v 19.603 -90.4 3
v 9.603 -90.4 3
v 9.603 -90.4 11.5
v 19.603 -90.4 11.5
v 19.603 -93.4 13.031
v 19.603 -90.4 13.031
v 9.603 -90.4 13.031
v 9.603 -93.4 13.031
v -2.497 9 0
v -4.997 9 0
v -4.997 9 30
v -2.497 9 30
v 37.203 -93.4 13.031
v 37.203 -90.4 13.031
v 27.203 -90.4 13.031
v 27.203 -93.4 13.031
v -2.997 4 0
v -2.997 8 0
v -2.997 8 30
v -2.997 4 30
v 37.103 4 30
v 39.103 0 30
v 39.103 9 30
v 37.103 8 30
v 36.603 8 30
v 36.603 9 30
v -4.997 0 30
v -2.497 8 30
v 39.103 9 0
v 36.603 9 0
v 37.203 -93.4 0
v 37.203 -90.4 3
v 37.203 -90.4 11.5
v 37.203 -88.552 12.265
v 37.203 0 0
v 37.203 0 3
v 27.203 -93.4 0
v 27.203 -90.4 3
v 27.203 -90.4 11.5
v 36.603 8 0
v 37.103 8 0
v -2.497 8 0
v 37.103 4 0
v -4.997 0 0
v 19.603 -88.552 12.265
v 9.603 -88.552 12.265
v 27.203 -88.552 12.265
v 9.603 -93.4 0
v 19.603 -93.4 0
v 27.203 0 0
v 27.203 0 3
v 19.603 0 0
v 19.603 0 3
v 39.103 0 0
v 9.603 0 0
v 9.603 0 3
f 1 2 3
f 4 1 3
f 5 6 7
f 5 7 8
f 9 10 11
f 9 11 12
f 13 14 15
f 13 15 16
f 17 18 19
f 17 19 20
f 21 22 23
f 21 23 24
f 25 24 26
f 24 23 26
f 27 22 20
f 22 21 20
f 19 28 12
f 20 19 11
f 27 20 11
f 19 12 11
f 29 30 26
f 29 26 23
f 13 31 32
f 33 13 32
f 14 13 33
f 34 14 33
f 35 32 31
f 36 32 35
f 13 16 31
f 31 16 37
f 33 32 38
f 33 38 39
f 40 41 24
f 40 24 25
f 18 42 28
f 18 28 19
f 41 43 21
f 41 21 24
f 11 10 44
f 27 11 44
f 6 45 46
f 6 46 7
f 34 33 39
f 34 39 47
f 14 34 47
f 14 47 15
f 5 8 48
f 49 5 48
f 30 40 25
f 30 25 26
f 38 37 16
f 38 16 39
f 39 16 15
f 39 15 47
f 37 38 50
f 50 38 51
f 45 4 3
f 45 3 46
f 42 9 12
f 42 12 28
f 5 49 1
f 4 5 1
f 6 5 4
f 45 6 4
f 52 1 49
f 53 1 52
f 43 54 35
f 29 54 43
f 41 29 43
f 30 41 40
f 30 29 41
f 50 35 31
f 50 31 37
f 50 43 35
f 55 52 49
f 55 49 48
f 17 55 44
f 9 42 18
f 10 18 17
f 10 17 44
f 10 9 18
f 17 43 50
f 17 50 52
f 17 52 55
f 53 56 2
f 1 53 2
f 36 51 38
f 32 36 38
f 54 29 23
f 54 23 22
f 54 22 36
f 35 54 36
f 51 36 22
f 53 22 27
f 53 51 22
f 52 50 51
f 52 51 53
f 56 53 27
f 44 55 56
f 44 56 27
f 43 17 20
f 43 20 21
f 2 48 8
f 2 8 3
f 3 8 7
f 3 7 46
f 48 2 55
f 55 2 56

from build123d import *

# Parameters (mm, degrees)
PAD_DEPTH    = 30
PAD001_DEPTH = 10
PAD002_DEPTH = 10


with BuildPart() as part:
    # Sketch → Pad (new body)
    with BuildSketch(Plane.XY):
        Polygon((-4.997332, 9), (-2.497332, 9), (-2.497332, 8), (-2.997332, 8), (-2.997332, 4), (37.102668, 4), (37.102668, 8), (36.602668, 8), (36.602668, 9), (39.102668, 9), (39.102668, 0), (-4.997332, 0), (-4.997332, 4), align=None)
    extrude(amount=PAD_DEPTH)

    # Sketch001 (on Face10 of Pad) → Pad001 (join)
    with BuildSketch(Plane.YZ.offset(9.602668)):
        Polygon((0.1, 0), (0.1, 3), (-90.4, 3), (-90.4, 11.5), (-88.552241, 12.265367), (-90.4, 13.030734), (-93.4, 13.030734), (-93.4, 0), align=None)
    extrude(amount=PAD001_DEPTH)

    # Sketch002 (on Face10 of Pad) → Pad002 (join)
    with BuildSketch(Plane.YZ.offset(27.202668)):
        Polygon((0.1, 0), (0.1, 3), (-90.4, 3), (-90.4, 11.5), (-88.552241, 12.265367), (-90.4, 13.030734), (-93.4, 13.030734), (-93.4, 0), align=None)
    extrude(amount=PAD002_DEPTH)


solid = part.part
